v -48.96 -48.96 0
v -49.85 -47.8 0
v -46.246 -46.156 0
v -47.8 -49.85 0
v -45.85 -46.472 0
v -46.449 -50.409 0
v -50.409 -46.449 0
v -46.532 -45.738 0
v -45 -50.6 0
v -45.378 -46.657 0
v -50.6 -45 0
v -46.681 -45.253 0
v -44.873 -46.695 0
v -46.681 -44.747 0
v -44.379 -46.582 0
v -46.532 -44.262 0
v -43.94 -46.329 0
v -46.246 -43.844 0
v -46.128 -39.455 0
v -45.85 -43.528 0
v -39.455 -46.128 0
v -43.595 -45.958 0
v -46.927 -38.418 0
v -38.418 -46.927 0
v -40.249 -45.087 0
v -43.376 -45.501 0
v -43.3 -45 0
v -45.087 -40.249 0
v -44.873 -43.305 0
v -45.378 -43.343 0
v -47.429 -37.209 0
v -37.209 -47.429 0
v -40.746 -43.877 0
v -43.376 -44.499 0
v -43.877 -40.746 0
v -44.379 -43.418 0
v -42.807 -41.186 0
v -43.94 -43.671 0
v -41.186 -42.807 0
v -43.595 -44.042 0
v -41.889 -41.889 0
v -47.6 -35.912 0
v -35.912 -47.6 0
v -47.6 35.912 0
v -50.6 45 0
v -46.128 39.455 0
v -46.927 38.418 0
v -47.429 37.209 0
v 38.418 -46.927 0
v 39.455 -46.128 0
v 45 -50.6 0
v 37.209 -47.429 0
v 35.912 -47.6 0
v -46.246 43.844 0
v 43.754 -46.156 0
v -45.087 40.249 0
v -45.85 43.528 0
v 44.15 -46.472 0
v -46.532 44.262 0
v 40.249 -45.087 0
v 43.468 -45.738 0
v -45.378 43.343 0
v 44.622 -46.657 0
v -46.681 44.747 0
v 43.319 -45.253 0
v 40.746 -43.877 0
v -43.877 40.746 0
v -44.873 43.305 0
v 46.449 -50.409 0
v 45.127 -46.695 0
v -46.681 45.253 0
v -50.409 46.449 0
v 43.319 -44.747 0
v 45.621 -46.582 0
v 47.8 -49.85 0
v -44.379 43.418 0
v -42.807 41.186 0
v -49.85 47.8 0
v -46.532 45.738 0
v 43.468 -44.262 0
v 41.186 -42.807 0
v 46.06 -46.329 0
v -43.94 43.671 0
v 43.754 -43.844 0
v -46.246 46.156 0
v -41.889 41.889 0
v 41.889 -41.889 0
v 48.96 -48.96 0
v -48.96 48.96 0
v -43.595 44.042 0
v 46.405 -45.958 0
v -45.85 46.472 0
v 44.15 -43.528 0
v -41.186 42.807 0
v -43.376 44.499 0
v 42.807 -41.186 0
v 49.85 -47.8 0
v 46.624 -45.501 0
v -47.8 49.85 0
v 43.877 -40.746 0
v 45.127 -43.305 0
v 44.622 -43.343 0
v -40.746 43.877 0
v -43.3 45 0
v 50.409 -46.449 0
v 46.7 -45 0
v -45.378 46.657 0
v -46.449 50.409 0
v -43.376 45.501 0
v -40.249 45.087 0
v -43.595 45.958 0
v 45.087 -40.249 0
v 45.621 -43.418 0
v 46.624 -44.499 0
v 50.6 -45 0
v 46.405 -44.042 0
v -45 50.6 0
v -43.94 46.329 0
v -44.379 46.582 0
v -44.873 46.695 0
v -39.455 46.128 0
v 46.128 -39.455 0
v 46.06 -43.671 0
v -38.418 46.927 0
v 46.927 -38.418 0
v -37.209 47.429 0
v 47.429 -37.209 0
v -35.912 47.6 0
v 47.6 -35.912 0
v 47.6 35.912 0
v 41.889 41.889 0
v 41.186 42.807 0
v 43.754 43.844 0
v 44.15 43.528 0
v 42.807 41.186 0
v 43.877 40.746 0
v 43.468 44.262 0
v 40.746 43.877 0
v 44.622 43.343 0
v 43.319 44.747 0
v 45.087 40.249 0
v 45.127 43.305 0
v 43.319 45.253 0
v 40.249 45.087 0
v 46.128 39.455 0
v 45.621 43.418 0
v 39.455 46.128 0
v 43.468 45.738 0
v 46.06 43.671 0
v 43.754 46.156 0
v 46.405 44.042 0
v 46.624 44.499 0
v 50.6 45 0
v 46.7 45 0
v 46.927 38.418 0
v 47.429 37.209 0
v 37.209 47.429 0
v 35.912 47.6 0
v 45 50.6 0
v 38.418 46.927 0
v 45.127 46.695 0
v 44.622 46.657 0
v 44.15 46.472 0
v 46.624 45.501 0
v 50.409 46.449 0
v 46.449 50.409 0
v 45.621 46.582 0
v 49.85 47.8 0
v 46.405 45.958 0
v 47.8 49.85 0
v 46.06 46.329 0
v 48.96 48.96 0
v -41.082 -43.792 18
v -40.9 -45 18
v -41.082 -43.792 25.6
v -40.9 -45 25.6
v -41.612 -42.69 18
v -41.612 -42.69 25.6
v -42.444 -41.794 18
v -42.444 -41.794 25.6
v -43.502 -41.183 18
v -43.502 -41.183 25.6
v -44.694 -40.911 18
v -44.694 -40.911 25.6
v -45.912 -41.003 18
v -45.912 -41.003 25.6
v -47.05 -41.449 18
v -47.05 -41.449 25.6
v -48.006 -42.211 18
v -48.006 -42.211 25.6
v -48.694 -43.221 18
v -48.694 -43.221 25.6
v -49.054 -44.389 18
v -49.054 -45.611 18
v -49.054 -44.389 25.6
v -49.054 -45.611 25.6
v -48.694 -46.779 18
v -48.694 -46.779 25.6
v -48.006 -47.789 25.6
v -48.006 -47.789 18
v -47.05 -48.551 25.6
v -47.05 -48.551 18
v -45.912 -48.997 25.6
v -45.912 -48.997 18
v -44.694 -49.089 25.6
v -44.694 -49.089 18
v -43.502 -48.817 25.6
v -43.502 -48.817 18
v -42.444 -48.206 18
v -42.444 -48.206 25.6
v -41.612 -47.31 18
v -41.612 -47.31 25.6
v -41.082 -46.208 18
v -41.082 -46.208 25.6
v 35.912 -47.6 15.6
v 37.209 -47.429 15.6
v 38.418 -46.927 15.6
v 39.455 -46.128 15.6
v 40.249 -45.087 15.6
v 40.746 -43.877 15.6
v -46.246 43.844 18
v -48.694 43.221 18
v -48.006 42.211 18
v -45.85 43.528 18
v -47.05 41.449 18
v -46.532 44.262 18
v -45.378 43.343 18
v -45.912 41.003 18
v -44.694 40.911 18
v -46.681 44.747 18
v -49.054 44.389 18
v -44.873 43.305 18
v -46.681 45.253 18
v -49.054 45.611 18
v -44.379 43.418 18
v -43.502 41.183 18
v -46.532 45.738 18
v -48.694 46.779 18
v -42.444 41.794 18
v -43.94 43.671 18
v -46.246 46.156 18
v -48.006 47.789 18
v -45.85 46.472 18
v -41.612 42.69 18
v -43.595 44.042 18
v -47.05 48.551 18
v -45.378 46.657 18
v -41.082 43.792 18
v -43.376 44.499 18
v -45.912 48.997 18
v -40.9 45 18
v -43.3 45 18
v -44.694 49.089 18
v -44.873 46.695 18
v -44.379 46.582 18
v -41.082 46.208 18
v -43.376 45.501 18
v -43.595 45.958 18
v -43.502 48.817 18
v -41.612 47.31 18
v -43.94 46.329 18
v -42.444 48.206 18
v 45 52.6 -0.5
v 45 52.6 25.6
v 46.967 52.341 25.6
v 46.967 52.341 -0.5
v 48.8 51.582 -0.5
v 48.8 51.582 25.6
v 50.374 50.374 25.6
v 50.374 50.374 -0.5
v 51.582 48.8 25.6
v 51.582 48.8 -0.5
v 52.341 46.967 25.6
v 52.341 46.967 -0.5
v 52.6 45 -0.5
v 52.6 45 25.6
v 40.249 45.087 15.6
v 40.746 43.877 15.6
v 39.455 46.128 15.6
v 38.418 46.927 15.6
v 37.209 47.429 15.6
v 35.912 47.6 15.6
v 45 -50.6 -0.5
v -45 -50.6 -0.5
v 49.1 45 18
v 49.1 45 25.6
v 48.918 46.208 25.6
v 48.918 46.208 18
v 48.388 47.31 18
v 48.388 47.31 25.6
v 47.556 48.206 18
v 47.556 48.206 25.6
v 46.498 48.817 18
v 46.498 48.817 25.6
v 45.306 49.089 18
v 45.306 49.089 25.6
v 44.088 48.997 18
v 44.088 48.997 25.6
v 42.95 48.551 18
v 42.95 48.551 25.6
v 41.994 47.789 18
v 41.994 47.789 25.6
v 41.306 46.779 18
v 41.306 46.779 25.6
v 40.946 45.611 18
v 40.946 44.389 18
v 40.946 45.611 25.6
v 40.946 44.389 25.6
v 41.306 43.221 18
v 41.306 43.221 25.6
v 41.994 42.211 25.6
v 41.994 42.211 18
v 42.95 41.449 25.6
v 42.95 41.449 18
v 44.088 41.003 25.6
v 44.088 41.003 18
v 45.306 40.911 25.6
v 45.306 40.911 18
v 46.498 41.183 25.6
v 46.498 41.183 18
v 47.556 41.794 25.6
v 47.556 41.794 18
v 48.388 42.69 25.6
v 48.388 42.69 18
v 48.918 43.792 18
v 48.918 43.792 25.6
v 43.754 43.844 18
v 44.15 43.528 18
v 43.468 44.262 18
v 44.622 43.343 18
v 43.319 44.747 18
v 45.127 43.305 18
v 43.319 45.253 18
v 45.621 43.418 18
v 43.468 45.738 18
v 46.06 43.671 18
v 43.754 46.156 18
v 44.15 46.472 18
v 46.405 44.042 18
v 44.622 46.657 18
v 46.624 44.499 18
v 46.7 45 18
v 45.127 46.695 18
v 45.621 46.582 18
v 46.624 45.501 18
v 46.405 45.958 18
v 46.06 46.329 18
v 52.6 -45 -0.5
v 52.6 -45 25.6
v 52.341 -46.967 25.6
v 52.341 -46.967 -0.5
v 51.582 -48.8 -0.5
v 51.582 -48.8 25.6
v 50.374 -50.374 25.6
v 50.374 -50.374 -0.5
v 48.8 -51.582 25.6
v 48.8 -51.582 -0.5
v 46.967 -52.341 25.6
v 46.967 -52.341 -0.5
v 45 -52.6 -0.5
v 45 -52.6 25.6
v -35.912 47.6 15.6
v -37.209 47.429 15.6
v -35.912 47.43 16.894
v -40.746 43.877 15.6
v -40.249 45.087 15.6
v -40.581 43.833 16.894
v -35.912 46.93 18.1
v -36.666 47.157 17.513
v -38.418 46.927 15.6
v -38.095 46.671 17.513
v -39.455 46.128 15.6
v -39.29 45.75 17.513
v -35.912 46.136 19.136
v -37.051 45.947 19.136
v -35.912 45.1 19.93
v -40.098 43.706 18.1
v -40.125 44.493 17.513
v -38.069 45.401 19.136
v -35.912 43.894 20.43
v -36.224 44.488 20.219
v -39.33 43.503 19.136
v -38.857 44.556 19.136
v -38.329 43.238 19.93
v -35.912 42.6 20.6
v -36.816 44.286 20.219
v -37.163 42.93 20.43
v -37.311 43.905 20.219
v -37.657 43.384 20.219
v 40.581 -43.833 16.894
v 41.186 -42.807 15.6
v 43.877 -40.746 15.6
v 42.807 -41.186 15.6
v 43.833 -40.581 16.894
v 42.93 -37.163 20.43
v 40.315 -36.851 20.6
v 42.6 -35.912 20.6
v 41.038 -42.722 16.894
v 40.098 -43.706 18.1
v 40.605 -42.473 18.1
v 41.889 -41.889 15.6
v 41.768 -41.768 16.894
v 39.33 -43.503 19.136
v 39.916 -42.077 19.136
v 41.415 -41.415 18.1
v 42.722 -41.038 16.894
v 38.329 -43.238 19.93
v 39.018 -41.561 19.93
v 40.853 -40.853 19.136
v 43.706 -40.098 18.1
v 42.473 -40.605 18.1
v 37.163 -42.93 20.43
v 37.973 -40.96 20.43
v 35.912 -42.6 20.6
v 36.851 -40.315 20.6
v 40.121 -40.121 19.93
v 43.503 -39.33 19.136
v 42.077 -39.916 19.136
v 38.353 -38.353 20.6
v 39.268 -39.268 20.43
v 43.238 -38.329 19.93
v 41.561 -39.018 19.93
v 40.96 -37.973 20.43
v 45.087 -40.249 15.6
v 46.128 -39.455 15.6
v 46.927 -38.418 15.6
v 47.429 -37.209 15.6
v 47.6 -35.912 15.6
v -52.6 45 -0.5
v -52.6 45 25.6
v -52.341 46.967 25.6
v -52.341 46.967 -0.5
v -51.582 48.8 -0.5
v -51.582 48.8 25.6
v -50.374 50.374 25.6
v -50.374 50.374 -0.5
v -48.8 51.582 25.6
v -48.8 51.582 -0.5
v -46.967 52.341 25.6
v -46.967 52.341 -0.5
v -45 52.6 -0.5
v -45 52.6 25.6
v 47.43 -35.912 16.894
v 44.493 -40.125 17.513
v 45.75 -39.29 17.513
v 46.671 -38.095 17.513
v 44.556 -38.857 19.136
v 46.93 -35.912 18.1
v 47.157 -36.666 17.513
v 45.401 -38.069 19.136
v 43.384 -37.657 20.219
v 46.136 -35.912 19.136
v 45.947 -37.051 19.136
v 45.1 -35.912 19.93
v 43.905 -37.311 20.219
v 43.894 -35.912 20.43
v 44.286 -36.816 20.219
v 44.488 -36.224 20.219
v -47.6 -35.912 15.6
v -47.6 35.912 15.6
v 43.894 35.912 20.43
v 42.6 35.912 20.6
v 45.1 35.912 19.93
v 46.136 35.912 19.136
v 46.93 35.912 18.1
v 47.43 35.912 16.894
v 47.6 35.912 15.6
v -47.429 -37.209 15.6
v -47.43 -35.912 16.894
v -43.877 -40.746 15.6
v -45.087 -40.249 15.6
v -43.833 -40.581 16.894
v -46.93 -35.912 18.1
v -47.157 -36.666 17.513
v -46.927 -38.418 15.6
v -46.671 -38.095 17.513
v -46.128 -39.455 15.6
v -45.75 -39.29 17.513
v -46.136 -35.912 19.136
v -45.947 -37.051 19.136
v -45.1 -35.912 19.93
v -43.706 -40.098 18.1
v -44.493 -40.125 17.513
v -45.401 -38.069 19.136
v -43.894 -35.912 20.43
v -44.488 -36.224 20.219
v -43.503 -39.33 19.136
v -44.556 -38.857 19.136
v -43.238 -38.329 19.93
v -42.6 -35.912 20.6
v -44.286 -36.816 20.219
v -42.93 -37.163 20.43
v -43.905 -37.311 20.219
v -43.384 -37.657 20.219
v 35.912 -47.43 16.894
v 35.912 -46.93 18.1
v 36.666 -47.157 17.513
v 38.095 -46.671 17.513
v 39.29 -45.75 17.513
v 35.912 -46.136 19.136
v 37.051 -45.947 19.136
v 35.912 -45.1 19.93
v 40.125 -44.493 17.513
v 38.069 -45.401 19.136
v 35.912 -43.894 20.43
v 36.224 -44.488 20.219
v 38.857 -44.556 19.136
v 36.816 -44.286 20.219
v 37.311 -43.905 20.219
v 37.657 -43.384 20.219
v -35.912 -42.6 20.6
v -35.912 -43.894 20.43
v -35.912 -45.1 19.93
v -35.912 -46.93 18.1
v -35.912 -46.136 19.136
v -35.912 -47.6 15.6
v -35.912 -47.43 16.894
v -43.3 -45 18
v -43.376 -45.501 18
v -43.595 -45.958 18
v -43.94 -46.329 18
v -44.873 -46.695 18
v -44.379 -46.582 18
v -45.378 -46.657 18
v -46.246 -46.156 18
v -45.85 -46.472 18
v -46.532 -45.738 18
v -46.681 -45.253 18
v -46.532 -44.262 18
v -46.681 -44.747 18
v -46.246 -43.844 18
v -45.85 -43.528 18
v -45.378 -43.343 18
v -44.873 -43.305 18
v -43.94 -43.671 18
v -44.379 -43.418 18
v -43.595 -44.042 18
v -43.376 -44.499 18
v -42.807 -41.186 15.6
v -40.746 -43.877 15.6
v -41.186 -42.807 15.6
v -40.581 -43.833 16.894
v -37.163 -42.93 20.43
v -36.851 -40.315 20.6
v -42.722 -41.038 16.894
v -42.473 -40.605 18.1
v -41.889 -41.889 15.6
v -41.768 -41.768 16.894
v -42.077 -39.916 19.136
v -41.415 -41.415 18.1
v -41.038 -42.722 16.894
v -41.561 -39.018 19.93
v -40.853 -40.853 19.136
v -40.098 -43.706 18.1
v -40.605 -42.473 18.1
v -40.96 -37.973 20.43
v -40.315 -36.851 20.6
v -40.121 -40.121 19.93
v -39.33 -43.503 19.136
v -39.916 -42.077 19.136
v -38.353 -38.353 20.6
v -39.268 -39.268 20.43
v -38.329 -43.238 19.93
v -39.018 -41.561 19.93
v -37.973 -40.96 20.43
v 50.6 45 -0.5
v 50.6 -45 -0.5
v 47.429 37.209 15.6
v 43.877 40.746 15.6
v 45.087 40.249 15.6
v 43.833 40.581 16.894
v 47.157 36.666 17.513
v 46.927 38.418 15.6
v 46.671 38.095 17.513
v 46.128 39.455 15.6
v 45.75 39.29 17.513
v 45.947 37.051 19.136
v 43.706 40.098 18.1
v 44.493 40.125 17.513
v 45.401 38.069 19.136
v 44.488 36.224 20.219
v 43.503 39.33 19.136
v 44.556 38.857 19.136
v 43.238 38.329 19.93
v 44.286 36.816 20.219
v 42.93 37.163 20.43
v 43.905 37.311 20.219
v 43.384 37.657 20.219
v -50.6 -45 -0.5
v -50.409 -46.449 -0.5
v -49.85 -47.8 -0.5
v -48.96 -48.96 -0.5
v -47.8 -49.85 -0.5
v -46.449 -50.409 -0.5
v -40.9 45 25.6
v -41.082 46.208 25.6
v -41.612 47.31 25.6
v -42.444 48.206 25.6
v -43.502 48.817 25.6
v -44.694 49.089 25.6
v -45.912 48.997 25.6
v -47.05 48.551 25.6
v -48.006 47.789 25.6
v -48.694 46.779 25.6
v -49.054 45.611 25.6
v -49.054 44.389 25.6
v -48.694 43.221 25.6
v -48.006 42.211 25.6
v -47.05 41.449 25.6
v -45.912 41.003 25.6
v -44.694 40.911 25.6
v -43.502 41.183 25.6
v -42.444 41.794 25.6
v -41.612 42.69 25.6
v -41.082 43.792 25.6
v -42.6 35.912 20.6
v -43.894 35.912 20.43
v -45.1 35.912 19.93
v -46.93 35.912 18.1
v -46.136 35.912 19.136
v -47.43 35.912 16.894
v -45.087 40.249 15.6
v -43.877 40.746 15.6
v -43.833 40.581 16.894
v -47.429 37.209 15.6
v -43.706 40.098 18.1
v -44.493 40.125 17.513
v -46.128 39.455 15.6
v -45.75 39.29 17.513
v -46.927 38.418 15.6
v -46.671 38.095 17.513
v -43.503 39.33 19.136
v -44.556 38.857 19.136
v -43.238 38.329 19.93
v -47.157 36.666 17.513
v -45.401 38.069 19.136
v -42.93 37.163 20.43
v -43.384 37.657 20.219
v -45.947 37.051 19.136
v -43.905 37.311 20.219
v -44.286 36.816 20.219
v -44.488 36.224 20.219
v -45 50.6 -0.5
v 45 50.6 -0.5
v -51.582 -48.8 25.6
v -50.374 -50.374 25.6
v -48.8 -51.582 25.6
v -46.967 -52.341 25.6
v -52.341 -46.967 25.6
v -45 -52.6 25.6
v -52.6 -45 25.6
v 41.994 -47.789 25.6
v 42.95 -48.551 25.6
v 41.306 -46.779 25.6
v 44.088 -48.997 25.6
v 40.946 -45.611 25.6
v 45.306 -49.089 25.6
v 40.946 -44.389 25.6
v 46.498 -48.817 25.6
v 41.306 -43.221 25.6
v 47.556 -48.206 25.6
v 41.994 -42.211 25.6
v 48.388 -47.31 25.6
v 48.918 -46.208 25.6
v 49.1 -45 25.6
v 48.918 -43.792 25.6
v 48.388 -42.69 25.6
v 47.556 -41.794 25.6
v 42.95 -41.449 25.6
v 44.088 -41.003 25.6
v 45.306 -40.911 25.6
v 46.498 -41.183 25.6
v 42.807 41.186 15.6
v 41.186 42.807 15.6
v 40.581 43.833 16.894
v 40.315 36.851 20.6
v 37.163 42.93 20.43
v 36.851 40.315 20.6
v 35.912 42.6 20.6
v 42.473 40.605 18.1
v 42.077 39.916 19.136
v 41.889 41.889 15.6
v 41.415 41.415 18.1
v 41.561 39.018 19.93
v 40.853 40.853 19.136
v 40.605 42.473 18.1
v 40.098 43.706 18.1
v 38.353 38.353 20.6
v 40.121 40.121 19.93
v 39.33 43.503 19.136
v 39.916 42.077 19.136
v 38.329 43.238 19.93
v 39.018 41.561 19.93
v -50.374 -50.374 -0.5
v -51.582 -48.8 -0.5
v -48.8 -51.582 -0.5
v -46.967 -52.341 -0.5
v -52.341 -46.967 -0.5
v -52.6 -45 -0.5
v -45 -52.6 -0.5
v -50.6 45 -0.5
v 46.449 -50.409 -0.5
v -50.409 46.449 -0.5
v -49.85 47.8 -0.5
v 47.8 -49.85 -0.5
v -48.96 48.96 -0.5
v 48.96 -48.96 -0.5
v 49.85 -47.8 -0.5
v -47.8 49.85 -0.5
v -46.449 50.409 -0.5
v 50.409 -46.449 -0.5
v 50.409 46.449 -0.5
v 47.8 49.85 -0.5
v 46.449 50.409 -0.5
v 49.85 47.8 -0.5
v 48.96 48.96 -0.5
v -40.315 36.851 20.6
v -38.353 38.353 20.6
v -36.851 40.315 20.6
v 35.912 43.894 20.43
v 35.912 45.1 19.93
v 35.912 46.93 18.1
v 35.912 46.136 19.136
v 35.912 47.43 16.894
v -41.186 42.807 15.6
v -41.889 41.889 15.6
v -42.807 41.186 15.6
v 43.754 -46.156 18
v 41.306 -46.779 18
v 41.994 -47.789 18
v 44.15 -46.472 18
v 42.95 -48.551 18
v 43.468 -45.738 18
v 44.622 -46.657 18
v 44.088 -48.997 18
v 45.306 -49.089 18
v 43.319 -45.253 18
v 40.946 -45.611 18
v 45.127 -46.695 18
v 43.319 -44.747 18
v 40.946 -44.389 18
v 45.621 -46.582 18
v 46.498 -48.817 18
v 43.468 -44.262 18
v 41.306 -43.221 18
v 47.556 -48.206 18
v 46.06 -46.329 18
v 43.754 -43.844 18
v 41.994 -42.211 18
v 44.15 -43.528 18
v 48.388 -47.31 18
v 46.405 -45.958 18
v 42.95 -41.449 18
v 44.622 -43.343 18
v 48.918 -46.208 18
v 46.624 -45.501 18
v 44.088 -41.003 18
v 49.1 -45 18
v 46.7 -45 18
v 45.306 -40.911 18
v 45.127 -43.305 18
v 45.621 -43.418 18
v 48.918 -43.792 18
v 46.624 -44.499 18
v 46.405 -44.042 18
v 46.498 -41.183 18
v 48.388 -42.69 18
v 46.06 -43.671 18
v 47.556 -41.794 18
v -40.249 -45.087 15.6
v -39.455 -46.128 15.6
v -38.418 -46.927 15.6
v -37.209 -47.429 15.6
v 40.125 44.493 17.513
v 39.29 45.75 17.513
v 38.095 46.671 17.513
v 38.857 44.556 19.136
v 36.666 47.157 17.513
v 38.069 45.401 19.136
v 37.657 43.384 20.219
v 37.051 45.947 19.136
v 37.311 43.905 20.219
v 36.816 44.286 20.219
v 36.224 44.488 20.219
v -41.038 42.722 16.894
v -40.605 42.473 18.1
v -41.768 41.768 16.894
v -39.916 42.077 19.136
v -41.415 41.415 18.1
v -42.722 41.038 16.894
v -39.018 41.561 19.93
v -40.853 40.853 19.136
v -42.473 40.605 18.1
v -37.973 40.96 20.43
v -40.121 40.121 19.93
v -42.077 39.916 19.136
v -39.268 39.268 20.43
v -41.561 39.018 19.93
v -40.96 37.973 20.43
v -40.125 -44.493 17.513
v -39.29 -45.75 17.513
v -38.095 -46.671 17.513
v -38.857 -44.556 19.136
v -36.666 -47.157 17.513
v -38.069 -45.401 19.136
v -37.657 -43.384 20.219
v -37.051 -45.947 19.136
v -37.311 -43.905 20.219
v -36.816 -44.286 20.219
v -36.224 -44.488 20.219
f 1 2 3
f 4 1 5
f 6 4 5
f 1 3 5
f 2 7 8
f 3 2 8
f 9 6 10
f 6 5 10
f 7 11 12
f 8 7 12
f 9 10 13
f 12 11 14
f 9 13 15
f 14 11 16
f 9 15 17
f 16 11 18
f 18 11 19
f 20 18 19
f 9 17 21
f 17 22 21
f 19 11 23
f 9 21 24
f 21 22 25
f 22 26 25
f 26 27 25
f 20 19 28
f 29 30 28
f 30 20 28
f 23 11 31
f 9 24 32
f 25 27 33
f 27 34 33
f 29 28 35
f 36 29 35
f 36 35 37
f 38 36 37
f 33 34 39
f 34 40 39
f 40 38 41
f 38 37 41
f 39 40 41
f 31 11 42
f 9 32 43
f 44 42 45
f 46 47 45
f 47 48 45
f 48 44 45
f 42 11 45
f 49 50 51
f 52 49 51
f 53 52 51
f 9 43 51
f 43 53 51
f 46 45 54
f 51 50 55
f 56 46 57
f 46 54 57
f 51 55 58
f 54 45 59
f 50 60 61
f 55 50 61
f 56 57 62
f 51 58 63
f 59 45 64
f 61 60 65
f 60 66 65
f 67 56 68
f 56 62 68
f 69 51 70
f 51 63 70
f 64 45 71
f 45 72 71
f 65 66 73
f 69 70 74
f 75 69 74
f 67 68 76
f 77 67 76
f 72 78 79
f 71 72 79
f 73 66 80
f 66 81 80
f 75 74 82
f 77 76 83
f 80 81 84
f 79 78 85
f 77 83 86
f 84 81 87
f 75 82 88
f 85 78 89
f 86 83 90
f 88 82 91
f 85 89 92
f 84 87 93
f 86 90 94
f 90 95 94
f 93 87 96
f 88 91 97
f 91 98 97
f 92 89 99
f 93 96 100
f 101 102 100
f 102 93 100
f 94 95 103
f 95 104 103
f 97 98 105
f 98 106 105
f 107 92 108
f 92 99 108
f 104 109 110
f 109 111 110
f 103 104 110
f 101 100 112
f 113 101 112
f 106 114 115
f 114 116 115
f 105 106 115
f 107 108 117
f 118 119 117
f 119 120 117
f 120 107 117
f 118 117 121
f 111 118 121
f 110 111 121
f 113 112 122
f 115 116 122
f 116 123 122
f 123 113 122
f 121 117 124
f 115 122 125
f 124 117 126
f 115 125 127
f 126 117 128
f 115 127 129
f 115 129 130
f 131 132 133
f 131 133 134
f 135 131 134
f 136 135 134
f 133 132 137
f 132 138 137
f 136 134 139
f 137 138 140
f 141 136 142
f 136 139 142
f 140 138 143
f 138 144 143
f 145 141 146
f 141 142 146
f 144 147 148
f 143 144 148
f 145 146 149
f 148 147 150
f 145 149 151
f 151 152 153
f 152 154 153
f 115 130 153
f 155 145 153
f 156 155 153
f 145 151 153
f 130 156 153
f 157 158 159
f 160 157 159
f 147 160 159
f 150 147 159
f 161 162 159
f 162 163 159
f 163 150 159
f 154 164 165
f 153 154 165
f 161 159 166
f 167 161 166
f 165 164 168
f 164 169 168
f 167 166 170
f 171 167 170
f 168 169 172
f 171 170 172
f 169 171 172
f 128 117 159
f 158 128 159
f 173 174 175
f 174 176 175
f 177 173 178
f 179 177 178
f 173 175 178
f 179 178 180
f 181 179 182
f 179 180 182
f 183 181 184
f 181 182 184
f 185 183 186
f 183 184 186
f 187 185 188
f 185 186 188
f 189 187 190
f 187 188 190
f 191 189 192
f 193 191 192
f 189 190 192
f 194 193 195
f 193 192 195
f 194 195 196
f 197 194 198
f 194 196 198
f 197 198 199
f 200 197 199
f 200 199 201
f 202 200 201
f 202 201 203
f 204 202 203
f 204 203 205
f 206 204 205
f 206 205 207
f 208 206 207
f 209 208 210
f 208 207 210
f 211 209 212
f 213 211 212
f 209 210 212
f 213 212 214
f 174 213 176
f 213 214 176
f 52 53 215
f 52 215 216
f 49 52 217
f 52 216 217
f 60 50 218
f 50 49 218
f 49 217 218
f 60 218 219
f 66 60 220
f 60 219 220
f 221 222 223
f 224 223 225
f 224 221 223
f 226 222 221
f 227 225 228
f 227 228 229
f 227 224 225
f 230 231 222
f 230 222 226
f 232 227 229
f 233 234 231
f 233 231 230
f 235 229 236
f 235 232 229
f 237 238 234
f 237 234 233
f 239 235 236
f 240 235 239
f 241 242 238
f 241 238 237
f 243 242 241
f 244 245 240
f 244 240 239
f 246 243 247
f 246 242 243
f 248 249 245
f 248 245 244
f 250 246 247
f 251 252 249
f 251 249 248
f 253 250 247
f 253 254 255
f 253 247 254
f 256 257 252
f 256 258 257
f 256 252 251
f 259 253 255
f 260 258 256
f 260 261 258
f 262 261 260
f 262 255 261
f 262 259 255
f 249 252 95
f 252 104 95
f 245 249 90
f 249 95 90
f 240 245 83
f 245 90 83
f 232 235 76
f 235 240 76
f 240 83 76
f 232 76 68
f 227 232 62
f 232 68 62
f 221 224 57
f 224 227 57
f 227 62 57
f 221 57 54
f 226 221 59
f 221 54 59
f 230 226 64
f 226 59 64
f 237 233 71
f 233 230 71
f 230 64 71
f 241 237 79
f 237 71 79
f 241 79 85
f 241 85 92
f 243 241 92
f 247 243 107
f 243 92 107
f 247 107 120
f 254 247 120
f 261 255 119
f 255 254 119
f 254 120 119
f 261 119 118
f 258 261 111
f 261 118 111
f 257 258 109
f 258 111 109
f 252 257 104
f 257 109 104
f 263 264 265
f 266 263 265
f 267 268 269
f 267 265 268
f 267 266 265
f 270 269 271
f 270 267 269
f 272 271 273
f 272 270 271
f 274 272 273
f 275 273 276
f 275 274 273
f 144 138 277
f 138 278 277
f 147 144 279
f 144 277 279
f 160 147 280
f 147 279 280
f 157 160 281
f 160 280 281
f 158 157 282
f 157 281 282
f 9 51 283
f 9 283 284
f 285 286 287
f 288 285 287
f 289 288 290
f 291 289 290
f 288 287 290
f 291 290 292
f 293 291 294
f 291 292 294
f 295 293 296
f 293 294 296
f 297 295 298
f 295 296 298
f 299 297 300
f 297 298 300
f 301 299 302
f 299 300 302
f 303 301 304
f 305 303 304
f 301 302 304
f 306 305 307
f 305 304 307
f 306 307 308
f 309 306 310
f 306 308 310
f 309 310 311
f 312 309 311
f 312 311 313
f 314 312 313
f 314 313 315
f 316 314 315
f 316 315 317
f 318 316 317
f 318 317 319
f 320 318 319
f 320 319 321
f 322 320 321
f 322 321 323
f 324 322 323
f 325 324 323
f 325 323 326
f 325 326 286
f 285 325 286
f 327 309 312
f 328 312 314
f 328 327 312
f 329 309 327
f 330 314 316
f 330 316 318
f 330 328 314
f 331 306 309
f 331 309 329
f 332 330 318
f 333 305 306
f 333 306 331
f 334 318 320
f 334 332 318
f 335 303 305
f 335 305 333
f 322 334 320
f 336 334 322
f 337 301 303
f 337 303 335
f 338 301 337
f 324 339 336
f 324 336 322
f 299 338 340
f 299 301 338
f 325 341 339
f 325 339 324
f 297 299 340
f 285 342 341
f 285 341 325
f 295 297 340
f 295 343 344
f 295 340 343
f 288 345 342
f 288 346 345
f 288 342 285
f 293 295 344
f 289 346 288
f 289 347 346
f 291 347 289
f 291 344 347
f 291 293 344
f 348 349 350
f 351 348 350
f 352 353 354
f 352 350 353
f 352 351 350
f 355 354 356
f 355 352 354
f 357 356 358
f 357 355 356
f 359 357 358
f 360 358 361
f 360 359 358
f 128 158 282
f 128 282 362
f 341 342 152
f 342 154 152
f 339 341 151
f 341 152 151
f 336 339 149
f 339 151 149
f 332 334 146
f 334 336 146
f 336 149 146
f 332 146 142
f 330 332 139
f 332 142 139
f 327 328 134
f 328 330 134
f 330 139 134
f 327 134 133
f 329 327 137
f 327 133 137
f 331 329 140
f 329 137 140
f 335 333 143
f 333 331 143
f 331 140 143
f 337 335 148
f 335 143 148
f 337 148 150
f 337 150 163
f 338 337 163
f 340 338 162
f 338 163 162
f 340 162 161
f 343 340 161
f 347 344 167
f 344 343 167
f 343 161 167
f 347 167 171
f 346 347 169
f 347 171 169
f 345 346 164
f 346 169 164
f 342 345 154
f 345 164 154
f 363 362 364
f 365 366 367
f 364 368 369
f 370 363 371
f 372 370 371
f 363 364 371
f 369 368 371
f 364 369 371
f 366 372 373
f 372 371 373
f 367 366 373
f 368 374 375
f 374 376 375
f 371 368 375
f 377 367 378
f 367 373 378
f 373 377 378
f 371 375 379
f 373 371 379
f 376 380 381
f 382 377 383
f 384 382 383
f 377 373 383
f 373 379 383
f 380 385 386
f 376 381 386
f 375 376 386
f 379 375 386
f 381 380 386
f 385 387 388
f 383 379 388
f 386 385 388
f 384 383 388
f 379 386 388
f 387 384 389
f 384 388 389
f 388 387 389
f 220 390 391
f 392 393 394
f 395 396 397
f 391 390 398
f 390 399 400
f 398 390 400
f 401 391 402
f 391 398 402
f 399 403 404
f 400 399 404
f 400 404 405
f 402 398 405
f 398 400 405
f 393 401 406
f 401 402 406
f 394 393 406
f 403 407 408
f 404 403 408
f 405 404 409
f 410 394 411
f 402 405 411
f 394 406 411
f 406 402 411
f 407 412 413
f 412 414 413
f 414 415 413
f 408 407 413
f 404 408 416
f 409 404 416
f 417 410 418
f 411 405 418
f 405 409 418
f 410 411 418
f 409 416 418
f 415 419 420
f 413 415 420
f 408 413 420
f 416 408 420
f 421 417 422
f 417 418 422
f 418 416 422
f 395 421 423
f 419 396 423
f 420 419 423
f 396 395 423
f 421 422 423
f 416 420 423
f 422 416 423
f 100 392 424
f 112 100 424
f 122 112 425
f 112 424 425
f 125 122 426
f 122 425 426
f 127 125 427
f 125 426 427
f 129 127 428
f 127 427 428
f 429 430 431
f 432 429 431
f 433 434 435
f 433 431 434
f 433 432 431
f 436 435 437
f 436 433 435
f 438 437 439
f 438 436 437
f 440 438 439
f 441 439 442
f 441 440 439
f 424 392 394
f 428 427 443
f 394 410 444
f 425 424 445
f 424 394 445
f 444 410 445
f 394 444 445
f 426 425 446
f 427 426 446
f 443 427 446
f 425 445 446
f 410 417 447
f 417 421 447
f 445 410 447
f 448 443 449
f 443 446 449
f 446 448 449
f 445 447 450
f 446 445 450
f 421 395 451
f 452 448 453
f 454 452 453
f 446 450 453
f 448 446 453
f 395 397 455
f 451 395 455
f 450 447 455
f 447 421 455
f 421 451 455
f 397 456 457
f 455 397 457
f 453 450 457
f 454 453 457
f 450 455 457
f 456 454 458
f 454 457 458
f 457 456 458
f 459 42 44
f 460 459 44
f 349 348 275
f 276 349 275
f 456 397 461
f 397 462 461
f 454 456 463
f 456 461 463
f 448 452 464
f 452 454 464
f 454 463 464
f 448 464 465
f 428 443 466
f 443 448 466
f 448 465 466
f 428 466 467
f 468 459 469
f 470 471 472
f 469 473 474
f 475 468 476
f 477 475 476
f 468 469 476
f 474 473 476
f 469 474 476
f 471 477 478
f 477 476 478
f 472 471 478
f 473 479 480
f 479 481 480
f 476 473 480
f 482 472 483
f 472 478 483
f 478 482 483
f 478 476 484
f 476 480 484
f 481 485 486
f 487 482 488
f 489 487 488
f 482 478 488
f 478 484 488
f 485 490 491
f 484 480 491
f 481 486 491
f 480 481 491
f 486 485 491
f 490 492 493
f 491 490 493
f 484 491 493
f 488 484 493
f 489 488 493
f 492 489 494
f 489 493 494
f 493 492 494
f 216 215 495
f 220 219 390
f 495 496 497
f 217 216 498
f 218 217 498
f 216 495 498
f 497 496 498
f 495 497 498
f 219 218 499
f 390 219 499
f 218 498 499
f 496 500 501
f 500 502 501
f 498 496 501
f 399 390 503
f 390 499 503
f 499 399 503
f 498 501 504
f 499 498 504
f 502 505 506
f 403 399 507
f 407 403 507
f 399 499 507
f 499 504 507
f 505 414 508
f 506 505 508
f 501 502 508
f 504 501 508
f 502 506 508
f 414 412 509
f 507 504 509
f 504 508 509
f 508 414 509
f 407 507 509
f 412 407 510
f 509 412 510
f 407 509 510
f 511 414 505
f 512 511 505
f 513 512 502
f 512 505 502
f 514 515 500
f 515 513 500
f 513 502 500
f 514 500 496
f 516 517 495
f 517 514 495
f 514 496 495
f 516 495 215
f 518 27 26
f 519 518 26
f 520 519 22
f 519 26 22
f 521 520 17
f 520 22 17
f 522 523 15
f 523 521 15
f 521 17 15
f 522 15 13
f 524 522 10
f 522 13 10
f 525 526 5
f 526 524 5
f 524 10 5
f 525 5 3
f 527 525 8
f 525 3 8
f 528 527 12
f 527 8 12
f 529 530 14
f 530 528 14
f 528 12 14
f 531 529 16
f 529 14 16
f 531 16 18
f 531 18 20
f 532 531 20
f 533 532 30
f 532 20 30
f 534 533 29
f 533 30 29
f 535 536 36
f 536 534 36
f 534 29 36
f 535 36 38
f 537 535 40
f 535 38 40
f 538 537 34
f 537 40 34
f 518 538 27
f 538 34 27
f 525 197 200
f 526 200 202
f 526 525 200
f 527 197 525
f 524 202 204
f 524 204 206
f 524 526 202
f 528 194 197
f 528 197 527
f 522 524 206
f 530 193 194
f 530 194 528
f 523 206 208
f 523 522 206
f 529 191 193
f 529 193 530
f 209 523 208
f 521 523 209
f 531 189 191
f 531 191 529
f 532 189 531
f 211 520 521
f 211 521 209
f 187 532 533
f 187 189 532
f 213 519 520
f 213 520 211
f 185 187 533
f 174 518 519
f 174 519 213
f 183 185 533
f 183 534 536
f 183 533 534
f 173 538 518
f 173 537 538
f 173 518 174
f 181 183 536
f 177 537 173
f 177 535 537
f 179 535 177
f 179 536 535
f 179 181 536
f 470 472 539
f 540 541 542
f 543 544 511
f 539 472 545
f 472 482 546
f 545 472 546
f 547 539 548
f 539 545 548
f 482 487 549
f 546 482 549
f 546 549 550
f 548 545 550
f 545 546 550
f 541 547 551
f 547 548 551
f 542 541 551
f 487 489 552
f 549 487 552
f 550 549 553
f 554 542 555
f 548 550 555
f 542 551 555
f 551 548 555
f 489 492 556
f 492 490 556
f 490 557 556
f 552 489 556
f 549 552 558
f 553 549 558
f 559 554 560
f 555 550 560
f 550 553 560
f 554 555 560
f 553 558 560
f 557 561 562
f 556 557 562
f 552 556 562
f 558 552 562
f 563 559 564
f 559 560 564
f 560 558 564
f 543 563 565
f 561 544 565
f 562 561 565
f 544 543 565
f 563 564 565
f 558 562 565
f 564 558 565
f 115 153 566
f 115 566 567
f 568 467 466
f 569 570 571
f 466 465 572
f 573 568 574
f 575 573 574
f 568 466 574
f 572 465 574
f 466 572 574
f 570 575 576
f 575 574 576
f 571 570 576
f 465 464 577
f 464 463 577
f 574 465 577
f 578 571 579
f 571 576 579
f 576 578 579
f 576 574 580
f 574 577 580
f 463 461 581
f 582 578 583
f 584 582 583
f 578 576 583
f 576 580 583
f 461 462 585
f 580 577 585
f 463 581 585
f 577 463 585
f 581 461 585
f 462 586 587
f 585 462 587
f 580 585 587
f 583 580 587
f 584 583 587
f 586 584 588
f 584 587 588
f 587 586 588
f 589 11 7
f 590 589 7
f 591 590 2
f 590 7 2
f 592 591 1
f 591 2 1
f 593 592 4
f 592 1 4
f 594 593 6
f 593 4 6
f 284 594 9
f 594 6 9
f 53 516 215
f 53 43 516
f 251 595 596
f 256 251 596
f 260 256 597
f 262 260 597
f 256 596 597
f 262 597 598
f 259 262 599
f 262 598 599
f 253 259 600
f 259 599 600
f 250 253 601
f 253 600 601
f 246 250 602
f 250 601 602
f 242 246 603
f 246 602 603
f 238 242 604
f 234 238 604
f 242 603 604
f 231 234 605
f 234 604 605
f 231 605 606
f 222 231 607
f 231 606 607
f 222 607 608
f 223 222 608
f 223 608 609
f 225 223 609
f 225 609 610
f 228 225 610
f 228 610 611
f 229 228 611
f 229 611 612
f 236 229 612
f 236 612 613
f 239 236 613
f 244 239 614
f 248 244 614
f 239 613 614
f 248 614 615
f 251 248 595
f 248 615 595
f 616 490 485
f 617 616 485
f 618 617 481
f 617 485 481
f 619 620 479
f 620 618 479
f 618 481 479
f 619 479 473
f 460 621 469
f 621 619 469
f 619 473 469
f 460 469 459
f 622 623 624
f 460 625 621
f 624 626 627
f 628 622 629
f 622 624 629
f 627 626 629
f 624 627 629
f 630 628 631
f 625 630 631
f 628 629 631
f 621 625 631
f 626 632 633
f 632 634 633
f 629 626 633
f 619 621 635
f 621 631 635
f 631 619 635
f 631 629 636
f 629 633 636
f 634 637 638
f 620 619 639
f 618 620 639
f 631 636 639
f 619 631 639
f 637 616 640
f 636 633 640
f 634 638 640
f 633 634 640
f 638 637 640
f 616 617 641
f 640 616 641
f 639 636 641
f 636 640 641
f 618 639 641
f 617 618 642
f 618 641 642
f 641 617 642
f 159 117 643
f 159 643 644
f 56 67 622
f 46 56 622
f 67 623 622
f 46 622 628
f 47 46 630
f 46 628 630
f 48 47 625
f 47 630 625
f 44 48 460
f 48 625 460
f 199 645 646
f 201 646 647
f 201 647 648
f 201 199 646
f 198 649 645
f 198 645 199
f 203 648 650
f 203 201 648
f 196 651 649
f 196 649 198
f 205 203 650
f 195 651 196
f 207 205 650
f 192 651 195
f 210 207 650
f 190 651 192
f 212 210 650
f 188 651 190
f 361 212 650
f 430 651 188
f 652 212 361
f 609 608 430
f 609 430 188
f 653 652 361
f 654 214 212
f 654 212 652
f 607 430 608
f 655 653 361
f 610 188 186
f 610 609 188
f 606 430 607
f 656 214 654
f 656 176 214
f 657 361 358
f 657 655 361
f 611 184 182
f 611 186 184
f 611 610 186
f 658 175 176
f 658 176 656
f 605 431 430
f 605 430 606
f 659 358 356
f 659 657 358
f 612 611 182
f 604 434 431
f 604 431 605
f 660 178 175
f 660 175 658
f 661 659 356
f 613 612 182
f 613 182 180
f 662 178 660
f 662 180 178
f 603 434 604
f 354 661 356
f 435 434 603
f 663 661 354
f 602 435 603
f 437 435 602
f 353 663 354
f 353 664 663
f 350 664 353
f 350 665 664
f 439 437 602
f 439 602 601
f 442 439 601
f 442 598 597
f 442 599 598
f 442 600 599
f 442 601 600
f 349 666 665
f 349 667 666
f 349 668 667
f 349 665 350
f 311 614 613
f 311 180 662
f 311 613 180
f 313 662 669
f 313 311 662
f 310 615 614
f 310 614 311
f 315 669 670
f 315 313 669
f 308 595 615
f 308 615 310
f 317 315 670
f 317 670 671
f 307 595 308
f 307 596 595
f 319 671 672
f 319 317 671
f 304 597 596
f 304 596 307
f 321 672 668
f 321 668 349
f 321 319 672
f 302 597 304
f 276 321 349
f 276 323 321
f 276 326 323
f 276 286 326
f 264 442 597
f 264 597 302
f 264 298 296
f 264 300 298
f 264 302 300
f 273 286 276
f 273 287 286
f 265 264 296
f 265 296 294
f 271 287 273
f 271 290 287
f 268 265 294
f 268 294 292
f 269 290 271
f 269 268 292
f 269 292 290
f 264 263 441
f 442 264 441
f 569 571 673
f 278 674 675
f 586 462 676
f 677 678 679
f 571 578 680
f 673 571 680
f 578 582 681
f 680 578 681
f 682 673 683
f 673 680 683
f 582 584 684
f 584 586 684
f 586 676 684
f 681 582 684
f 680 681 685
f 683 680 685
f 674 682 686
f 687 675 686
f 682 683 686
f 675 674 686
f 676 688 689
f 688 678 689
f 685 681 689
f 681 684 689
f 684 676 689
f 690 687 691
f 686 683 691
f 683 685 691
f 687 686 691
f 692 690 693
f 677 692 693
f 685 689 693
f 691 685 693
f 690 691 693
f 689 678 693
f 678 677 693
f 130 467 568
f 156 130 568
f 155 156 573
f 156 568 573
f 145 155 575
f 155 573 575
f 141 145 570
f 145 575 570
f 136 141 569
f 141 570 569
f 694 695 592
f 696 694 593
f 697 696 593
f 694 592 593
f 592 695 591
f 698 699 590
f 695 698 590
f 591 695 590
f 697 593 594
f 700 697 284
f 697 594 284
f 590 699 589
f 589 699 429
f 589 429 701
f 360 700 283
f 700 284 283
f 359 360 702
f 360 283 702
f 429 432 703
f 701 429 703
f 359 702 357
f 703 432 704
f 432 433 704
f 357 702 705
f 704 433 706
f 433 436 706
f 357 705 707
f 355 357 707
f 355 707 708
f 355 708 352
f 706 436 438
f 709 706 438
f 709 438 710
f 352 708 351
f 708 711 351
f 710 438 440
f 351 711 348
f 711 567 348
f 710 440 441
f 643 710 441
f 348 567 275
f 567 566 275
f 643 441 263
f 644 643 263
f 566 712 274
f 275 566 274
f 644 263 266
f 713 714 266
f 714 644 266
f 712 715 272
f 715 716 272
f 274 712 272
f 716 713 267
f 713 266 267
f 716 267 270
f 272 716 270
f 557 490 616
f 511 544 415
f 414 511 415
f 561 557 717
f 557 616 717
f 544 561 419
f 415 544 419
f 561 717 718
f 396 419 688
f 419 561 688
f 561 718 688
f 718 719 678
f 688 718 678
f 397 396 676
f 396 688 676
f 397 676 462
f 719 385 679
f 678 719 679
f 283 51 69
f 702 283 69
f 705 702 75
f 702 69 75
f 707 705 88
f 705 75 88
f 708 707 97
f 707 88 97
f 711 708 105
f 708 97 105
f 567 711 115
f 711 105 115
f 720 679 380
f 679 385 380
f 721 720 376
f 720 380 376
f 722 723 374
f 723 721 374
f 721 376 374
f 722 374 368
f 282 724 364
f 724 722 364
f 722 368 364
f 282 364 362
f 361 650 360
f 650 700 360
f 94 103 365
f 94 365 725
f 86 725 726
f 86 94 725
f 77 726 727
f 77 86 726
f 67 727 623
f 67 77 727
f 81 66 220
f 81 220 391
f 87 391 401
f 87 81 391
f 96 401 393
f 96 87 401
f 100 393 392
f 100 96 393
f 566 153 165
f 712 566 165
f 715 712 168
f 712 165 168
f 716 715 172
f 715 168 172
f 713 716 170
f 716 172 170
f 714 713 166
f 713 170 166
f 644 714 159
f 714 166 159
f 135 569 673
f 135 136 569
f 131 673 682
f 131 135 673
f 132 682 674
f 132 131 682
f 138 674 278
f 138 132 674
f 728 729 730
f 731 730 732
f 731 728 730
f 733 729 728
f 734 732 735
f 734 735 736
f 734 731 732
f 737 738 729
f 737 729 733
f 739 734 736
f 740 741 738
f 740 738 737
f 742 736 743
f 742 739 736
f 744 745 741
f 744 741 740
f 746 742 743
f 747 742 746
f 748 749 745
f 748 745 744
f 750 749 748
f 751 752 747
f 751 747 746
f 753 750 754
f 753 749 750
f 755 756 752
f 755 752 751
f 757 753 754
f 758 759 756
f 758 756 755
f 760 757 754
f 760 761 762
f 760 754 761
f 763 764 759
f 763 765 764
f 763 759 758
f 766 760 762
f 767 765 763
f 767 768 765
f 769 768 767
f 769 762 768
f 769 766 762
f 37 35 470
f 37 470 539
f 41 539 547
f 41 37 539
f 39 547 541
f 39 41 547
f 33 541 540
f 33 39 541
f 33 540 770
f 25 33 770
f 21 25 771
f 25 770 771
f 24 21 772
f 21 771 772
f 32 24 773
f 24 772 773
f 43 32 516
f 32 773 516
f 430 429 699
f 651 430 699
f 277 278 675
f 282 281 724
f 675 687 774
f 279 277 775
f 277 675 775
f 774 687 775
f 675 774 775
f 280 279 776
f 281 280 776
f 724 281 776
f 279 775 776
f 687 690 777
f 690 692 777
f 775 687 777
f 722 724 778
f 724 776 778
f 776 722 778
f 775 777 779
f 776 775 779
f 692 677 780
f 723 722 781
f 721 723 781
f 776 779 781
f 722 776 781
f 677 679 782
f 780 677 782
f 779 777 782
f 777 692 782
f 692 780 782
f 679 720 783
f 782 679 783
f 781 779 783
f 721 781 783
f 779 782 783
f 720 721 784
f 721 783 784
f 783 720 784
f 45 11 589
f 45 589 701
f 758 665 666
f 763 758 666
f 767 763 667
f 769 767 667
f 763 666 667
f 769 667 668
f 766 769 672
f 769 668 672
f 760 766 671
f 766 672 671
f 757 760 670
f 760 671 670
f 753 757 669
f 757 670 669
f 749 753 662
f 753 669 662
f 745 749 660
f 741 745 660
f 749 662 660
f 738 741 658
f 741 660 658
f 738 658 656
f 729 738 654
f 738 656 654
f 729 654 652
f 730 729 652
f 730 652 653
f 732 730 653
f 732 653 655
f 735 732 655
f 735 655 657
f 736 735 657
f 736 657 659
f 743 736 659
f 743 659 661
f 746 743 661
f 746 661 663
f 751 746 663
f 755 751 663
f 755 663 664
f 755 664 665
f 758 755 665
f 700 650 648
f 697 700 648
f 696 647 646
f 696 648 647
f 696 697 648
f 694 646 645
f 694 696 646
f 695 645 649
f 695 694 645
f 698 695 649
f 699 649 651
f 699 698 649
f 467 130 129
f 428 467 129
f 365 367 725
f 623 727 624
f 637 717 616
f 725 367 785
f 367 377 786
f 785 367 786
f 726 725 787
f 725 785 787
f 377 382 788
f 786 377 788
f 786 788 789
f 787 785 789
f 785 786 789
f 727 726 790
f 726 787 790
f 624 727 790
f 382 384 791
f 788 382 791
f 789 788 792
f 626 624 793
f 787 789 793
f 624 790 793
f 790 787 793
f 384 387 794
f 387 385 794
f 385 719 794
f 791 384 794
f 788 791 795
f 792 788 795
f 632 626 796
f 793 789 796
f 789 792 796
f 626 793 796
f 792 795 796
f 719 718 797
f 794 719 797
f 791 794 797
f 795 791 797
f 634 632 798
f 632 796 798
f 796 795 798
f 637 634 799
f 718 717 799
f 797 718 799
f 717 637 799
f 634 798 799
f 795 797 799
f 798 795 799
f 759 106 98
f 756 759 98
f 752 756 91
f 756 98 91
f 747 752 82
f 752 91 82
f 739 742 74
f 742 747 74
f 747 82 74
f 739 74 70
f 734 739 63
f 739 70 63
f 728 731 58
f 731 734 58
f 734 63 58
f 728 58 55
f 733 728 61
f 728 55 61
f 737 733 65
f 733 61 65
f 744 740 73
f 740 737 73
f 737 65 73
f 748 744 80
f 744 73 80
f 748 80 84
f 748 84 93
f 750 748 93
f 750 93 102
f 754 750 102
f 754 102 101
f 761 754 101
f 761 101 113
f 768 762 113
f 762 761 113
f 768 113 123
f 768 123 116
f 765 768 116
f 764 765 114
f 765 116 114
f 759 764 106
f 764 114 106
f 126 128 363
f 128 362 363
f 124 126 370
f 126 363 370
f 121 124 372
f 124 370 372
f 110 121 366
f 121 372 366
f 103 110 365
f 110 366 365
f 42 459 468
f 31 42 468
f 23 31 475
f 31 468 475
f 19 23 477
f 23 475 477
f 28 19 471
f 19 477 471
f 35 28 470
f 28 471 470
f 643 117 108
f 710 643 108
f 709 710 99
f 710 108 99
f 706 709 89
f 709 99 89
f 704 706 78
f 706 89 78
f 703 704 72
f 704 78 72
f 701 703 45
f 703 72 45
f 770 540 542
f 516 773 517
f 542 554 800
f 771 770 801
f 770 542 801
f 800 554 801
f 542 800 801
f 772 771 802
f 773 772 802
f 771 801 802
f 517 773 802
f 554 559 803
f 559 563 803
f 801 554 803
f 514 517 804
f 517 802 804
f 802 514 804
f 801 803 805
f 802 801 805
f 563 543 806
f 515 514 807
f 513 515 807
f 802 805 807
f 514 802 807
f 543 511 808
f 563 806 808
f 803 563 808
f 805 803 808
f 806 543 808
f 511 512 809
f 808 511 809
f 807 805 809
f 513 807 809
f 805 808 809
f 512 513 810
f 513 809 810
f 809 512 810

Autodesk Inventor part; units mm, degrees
ref_plane "YZ Plane" through (0, 0, 0) normal (1, 0, 0) x (0, 1, 0)
ref_plane "XZ Plane" through (0, 0, 0) normal (0, 1, 0) x (-1, 0, 0)
ref_plane "XY Plane" through (0, 0, 0) normal (0, 0, 1) x (1, 0, 0)
sketch "Skizze1" plane through (0, 0, 0) normal (0, 0, 1) x (1, 0, 0)
  line L0 (45, 50) -> (-45, 50)
  line L1 (-50, 45) -> (-50, -45)
  line L2 (-45, -50) -> (45, -50)
  line L3 (50, -45) -> (50, 45)
  line L4 (50, 50) -> (-50, -50) construction
  line L5 (-50, 50) -> (50, -50) construction
  arc A0 (45, -50) -> (50, -45) centre (45, -45) ccw
  arc A1 (-50, -45) -> (-45, -50) centre (-45, -45) ccw
  arc A2 (-45, 50) -> (-50, 45) centre (-45, 45) ccw
  arc A3 (50, 45) -> (45, 50) centre (45, 45) ccw
  line L6 (45, -50.6) -> (-45, -50.6)
  arc A4 (-50.6, -45) -> (-45, -50.6) centre (-45, -45) ccw
  line L7 (-50.6, -45) -> (-50.6, 45)
  arc A5 (-45, 50.6) -> (-50.6, 45) centre (-45, 45) ccw
  line L8 (-45, 50.6) -> (45, 50.6)
  arc A6 (50.6, 45) -> (45, 50.6) centre (45, 45) ccw
  line L9 (50.6, 45) -> (50.6, -45)
  arc A7 (45, -50.6) -> (50.6, -45) centre (45, -45) ccw
  line L10 (-45, -52.6) -> (45, -52.6)
  arc A8 (45, -52.6) -> (52.6, -45) centre (45, -45) ccw
  line L11 (52.6, -45) -> (52.6, 45)
  arc A9 (52.6, 45) -> (45, 52.6) centre (45, 45) ccw
  line L12 (45, 52.6) -> (-45, 52.6)
  arc A10 (-45, 52.6) -> (-52.6, 45) centre (-45, 45) ccw
  line L13 (-52.6, 45) -> (-52.6, -45)
  arc A11 (-52.6, -45) -> (-45, -52.6) centre (-45, -45) ccw
  point P0 (0, 0)
  point P1 (0, 0)
  dimension "d0" = 100
  dimension "d1" = 100
  dimension "d2" = 5
  dimension "d3" = 0.6
  dimension "d4" = 2
extrude "Extrusion1" add sketch "Skizze1" against normal blind 0.5 contours A11 L13 A10 L12 A9 L11 A8 L10
sketch "Skizze2" plane through (0, 0, 0) normal (0, 0, 1) x (1, 0, 0)
  line L0 (45, 52.6) -> (-45, 52.6) projected
  arc A0 (52.6, 45) -> (45, 52.6) centre (45, 45) ccw projected
  line L1 (52.6, -45) -> (52.6, 45) projected
  arc A1 (45, -52.6) -> (52.6, -45) centre (45, -45) ccw projected
  line L2 (-45, -52.6) -> (45, -52.6) projected
  arc A2 (-52.6, -45) -> (-45, -52.6) centre (-45, -45) ccw projected
  line L3 (-52.6, 45) -> (-52.6, -45) projected
  arc A3 (-45, 52.6) -> (-52.6, 45) centre (-45, 45) ccw projected
  line L4 (-41.4504, 47.6) -> (0, 47.6)
  line L5 (-47.6, 0) -> (-47.6, 41.4504)
  circle A4 centre (-45, 45) radius 1.7
  line L6 (-45, 50.6) -> (45, 50.6) projected
  line L7 (-50.6, -45) -> (-50.6, 45) projected
  arc A5 (-47.6, 41.4504) -> (-41.4504, 47.6) centre (-45, 45) ccw
  line L8 (-45, 52.6) -> (45, 52.6) construction
  line L9 (0, 52.6) -> (0, -52.6) construction
  line L10 (45, -52.6) -> (-45, -52.6) construction
  line L11 (-52.6, 0) -> (52.6, 0) construction
  line L12 (41.4504, 47.6) -> (0, 47.6)
  line L13 (47.6, 0) -> (47.6, 41.4504)
  circle A6 centre (45, 45) radius 1.7
  arc A7 (41.4504, 47.6) -> (47.6, 41.4504) centre (45, 45) ccw
  line L14 (-41.4504, -47.6) -> (0, -47.6)
  line L15 (-47.6, 0) -> (-47.6, -41.4504)
  circle A8 centre (-45, -45) radius 1.7
  arc A9 (-41.4504, -47.6) -> (-47.6, -41.4504) centre (-45, -45) ccw
  line L16 (47.6, 0) -> (47.6, -41.4504)
  arc A10 (47.6, -41.4504) -> (41.4504, -47.6) centre (45, -45) ccw
  circle A11 centre (45, -45) radius 1.7
  line L17 (41.4504, -47.6) -> (0, -47.6)
  point P0 (0, 0)
  dimension "d11" = 5
  dimension "d13" = 5
  dimension "d15" = 3.4
  dimension "d16" = 5.6
  dimension "d17" = 5.6
  dimension "d18" = 4.4
extrude "Extrusion2" add sketch "Skizze2" along normal blind 20.6
sketch "Skizze3" plane through (0, 0, 20.6) normal (0, 0, 1) x (1, 0, 0)
  line L0 (-52.6, 45) -> (-52.6, -45) projected
  arc A0 (-52.6, -45) -> (-45, -52.6) centre (-45, -45) ccw projected
  line L1 (-45, -52.6) -> (45, -52.6) projected
  arc A1 (45, -52.6) -> (52.6, -45) centre (45, -45) ccw projected
  line L2 (52.6, -45) -> (52.6, 45) projected
  arc A2 (52.6, 45) -> (45, 52.6) centre (45, 45) ccw projected
  line L3 (45, 52.6) -> (-45, 52.6) projected
  arc A3 (-45, 52.6) -> (-52.6, 45) centre (-45, 45) ccw projected
  point P0 (0, 0)
extrude "Extrusion3" add sketch "Skizze3" along normal blind 5
fillet "Rundung1" radius 5 8 edges at (-47.6, 41.4504, 10.3) (-41.4504, 47.6, 10.3) (47.6, 41.4504, 10.3) (41.4504, 47.6, 10.3) (41.4504, -47.6, 10.3) (47.6, -41.4504, 10.3) (-41.4504, -47.6, 10.3) (-47.6, -41.4504, 10.3)
fillet "Rundung2" radius 5 16 edges at (-46.5612, 38.9625, 20.6) (-41.8887, 41.8887, 20.6) (-38.9625, 46.5612, 20.6) (0, 47.6, 20.6) (38.9625, 46.5612, 20.6) (41.8887, 41.8887, 20.6) (46.5612, 38.9625, 20.6) (47.6, 0, 20.6) (46.5612, -38.9625, 20.6) (41.8887, -41.8887, 20.6) (38.9625, -46.5612, 20.6) (0, -47.6, 20.6) (-38.9625, -46.5612, 20.6) (-41.8887, -41.8887, 20.6) (-46.5612, -38.9625, 20.6) (-47.6, 0, 20.6)
sketch "Skizze4" plane through (0, 0, 25.6) normal (0, 0, 1) x (1, 0, 0)
  arc A0 (-45, 52.6) -> (-52.6, 45) centre (-45, 45) ccw projected
  arc A1 (52.6, 45) -> (45, 52.6) centre (45, 45) ccw projected
  arc A2 (45, -52.6) -> (52.6, -45) centre (45, -45) ccw projected
  arc A3 (-52.6, -45) -> (-45, -52.6) centre (-45, -45) ccw projected
  circle A4 centre (-45, 45) radius 1.7 projected
  circle A5 centre (-45, 45) radius 4.1
  circle A6 centre (45, 45) radius 4.1
  circle A7 centre (45, -45) radius 1.7 projected
  circle A8 centre (45, -45) radius 4.1
  circle A9 centre (-45, -45) radius 1.7 projected
  circle A10 centre (-45, -45) radius 4.1
  point P0 (0, 0)
  dimension "d25" = 8.2
  dimension "d26" = 8.2
  dimension "d27" = 8.2
  dimension "d28" = 8.2
extrude "ExtrusionSchraubenKopf" cut sketch "Skizze4" against normal blind 7.6 contours A4 | A5 | A6 | A7 | A8 | A9 | A10
sketch "Skizze5" plane through (0, 0, 0) normal (0, 0, -1) x (-1, 0, 0)
  circle A0 centre (45, 45) radius 1.7 projected
  circle A1 centre (45, -45) radius 1.7 projected
  circle A2 centre (-45, -45) radius 1.7 projected
  circle A3 centre (-45, 45) radius 1.7 projected
  point P0 (0, 0)
extrude "ExtrusionSchraubenLoch" cut sketch "Skizze5" against normal up to surface (25.6 mm away)
equation "\"d0\" = BP"
equation "\"d1\" = LP"
equation "\"d2\" = REP"
equation "\"d3\" = TM"
equation "\"d9\" = -0.5 * TM + 0.5 * HPt"
equation "\"d11\" = DW"
equation "\"d13\" = DW"
equation "\"d15\" = DL"
equation "\"d16\" = REP + TM"
equation "\"d17\" = REP + TM"
equation "\"d19\" = HPb + TM"
equation "\"d21\" = DW"
equation "\"d23\" = RR"
equation "\"d24\" = RR"
equation "\"d25\" = SKD + 2 * TM"
equation "\"d26\" = SKD + 2 * TM"
equation "\"d27\" = SKD + 2 * TM"
equation "\"d28\" = SKD + 2 * TM"
equation "\"d29\" = SKH + TM"
equation "\"BP\" = 100"
equation "\"LP\" = 100"
equation "\"REP\" = 5"
equation "\"TM\" = 0.6"
equation "\"DW\" = 5"
equation "\"DL\" = 3.4"
equation "\"HPt\" = 1.6"
equation "\"HPb\" = 20"
equation "\"RR\" = 5"
equation "\"SKD\" = 7"
equation "\"SKH\" = 7"
properties part number "GehauseGenerator_GehauseVorlage"
